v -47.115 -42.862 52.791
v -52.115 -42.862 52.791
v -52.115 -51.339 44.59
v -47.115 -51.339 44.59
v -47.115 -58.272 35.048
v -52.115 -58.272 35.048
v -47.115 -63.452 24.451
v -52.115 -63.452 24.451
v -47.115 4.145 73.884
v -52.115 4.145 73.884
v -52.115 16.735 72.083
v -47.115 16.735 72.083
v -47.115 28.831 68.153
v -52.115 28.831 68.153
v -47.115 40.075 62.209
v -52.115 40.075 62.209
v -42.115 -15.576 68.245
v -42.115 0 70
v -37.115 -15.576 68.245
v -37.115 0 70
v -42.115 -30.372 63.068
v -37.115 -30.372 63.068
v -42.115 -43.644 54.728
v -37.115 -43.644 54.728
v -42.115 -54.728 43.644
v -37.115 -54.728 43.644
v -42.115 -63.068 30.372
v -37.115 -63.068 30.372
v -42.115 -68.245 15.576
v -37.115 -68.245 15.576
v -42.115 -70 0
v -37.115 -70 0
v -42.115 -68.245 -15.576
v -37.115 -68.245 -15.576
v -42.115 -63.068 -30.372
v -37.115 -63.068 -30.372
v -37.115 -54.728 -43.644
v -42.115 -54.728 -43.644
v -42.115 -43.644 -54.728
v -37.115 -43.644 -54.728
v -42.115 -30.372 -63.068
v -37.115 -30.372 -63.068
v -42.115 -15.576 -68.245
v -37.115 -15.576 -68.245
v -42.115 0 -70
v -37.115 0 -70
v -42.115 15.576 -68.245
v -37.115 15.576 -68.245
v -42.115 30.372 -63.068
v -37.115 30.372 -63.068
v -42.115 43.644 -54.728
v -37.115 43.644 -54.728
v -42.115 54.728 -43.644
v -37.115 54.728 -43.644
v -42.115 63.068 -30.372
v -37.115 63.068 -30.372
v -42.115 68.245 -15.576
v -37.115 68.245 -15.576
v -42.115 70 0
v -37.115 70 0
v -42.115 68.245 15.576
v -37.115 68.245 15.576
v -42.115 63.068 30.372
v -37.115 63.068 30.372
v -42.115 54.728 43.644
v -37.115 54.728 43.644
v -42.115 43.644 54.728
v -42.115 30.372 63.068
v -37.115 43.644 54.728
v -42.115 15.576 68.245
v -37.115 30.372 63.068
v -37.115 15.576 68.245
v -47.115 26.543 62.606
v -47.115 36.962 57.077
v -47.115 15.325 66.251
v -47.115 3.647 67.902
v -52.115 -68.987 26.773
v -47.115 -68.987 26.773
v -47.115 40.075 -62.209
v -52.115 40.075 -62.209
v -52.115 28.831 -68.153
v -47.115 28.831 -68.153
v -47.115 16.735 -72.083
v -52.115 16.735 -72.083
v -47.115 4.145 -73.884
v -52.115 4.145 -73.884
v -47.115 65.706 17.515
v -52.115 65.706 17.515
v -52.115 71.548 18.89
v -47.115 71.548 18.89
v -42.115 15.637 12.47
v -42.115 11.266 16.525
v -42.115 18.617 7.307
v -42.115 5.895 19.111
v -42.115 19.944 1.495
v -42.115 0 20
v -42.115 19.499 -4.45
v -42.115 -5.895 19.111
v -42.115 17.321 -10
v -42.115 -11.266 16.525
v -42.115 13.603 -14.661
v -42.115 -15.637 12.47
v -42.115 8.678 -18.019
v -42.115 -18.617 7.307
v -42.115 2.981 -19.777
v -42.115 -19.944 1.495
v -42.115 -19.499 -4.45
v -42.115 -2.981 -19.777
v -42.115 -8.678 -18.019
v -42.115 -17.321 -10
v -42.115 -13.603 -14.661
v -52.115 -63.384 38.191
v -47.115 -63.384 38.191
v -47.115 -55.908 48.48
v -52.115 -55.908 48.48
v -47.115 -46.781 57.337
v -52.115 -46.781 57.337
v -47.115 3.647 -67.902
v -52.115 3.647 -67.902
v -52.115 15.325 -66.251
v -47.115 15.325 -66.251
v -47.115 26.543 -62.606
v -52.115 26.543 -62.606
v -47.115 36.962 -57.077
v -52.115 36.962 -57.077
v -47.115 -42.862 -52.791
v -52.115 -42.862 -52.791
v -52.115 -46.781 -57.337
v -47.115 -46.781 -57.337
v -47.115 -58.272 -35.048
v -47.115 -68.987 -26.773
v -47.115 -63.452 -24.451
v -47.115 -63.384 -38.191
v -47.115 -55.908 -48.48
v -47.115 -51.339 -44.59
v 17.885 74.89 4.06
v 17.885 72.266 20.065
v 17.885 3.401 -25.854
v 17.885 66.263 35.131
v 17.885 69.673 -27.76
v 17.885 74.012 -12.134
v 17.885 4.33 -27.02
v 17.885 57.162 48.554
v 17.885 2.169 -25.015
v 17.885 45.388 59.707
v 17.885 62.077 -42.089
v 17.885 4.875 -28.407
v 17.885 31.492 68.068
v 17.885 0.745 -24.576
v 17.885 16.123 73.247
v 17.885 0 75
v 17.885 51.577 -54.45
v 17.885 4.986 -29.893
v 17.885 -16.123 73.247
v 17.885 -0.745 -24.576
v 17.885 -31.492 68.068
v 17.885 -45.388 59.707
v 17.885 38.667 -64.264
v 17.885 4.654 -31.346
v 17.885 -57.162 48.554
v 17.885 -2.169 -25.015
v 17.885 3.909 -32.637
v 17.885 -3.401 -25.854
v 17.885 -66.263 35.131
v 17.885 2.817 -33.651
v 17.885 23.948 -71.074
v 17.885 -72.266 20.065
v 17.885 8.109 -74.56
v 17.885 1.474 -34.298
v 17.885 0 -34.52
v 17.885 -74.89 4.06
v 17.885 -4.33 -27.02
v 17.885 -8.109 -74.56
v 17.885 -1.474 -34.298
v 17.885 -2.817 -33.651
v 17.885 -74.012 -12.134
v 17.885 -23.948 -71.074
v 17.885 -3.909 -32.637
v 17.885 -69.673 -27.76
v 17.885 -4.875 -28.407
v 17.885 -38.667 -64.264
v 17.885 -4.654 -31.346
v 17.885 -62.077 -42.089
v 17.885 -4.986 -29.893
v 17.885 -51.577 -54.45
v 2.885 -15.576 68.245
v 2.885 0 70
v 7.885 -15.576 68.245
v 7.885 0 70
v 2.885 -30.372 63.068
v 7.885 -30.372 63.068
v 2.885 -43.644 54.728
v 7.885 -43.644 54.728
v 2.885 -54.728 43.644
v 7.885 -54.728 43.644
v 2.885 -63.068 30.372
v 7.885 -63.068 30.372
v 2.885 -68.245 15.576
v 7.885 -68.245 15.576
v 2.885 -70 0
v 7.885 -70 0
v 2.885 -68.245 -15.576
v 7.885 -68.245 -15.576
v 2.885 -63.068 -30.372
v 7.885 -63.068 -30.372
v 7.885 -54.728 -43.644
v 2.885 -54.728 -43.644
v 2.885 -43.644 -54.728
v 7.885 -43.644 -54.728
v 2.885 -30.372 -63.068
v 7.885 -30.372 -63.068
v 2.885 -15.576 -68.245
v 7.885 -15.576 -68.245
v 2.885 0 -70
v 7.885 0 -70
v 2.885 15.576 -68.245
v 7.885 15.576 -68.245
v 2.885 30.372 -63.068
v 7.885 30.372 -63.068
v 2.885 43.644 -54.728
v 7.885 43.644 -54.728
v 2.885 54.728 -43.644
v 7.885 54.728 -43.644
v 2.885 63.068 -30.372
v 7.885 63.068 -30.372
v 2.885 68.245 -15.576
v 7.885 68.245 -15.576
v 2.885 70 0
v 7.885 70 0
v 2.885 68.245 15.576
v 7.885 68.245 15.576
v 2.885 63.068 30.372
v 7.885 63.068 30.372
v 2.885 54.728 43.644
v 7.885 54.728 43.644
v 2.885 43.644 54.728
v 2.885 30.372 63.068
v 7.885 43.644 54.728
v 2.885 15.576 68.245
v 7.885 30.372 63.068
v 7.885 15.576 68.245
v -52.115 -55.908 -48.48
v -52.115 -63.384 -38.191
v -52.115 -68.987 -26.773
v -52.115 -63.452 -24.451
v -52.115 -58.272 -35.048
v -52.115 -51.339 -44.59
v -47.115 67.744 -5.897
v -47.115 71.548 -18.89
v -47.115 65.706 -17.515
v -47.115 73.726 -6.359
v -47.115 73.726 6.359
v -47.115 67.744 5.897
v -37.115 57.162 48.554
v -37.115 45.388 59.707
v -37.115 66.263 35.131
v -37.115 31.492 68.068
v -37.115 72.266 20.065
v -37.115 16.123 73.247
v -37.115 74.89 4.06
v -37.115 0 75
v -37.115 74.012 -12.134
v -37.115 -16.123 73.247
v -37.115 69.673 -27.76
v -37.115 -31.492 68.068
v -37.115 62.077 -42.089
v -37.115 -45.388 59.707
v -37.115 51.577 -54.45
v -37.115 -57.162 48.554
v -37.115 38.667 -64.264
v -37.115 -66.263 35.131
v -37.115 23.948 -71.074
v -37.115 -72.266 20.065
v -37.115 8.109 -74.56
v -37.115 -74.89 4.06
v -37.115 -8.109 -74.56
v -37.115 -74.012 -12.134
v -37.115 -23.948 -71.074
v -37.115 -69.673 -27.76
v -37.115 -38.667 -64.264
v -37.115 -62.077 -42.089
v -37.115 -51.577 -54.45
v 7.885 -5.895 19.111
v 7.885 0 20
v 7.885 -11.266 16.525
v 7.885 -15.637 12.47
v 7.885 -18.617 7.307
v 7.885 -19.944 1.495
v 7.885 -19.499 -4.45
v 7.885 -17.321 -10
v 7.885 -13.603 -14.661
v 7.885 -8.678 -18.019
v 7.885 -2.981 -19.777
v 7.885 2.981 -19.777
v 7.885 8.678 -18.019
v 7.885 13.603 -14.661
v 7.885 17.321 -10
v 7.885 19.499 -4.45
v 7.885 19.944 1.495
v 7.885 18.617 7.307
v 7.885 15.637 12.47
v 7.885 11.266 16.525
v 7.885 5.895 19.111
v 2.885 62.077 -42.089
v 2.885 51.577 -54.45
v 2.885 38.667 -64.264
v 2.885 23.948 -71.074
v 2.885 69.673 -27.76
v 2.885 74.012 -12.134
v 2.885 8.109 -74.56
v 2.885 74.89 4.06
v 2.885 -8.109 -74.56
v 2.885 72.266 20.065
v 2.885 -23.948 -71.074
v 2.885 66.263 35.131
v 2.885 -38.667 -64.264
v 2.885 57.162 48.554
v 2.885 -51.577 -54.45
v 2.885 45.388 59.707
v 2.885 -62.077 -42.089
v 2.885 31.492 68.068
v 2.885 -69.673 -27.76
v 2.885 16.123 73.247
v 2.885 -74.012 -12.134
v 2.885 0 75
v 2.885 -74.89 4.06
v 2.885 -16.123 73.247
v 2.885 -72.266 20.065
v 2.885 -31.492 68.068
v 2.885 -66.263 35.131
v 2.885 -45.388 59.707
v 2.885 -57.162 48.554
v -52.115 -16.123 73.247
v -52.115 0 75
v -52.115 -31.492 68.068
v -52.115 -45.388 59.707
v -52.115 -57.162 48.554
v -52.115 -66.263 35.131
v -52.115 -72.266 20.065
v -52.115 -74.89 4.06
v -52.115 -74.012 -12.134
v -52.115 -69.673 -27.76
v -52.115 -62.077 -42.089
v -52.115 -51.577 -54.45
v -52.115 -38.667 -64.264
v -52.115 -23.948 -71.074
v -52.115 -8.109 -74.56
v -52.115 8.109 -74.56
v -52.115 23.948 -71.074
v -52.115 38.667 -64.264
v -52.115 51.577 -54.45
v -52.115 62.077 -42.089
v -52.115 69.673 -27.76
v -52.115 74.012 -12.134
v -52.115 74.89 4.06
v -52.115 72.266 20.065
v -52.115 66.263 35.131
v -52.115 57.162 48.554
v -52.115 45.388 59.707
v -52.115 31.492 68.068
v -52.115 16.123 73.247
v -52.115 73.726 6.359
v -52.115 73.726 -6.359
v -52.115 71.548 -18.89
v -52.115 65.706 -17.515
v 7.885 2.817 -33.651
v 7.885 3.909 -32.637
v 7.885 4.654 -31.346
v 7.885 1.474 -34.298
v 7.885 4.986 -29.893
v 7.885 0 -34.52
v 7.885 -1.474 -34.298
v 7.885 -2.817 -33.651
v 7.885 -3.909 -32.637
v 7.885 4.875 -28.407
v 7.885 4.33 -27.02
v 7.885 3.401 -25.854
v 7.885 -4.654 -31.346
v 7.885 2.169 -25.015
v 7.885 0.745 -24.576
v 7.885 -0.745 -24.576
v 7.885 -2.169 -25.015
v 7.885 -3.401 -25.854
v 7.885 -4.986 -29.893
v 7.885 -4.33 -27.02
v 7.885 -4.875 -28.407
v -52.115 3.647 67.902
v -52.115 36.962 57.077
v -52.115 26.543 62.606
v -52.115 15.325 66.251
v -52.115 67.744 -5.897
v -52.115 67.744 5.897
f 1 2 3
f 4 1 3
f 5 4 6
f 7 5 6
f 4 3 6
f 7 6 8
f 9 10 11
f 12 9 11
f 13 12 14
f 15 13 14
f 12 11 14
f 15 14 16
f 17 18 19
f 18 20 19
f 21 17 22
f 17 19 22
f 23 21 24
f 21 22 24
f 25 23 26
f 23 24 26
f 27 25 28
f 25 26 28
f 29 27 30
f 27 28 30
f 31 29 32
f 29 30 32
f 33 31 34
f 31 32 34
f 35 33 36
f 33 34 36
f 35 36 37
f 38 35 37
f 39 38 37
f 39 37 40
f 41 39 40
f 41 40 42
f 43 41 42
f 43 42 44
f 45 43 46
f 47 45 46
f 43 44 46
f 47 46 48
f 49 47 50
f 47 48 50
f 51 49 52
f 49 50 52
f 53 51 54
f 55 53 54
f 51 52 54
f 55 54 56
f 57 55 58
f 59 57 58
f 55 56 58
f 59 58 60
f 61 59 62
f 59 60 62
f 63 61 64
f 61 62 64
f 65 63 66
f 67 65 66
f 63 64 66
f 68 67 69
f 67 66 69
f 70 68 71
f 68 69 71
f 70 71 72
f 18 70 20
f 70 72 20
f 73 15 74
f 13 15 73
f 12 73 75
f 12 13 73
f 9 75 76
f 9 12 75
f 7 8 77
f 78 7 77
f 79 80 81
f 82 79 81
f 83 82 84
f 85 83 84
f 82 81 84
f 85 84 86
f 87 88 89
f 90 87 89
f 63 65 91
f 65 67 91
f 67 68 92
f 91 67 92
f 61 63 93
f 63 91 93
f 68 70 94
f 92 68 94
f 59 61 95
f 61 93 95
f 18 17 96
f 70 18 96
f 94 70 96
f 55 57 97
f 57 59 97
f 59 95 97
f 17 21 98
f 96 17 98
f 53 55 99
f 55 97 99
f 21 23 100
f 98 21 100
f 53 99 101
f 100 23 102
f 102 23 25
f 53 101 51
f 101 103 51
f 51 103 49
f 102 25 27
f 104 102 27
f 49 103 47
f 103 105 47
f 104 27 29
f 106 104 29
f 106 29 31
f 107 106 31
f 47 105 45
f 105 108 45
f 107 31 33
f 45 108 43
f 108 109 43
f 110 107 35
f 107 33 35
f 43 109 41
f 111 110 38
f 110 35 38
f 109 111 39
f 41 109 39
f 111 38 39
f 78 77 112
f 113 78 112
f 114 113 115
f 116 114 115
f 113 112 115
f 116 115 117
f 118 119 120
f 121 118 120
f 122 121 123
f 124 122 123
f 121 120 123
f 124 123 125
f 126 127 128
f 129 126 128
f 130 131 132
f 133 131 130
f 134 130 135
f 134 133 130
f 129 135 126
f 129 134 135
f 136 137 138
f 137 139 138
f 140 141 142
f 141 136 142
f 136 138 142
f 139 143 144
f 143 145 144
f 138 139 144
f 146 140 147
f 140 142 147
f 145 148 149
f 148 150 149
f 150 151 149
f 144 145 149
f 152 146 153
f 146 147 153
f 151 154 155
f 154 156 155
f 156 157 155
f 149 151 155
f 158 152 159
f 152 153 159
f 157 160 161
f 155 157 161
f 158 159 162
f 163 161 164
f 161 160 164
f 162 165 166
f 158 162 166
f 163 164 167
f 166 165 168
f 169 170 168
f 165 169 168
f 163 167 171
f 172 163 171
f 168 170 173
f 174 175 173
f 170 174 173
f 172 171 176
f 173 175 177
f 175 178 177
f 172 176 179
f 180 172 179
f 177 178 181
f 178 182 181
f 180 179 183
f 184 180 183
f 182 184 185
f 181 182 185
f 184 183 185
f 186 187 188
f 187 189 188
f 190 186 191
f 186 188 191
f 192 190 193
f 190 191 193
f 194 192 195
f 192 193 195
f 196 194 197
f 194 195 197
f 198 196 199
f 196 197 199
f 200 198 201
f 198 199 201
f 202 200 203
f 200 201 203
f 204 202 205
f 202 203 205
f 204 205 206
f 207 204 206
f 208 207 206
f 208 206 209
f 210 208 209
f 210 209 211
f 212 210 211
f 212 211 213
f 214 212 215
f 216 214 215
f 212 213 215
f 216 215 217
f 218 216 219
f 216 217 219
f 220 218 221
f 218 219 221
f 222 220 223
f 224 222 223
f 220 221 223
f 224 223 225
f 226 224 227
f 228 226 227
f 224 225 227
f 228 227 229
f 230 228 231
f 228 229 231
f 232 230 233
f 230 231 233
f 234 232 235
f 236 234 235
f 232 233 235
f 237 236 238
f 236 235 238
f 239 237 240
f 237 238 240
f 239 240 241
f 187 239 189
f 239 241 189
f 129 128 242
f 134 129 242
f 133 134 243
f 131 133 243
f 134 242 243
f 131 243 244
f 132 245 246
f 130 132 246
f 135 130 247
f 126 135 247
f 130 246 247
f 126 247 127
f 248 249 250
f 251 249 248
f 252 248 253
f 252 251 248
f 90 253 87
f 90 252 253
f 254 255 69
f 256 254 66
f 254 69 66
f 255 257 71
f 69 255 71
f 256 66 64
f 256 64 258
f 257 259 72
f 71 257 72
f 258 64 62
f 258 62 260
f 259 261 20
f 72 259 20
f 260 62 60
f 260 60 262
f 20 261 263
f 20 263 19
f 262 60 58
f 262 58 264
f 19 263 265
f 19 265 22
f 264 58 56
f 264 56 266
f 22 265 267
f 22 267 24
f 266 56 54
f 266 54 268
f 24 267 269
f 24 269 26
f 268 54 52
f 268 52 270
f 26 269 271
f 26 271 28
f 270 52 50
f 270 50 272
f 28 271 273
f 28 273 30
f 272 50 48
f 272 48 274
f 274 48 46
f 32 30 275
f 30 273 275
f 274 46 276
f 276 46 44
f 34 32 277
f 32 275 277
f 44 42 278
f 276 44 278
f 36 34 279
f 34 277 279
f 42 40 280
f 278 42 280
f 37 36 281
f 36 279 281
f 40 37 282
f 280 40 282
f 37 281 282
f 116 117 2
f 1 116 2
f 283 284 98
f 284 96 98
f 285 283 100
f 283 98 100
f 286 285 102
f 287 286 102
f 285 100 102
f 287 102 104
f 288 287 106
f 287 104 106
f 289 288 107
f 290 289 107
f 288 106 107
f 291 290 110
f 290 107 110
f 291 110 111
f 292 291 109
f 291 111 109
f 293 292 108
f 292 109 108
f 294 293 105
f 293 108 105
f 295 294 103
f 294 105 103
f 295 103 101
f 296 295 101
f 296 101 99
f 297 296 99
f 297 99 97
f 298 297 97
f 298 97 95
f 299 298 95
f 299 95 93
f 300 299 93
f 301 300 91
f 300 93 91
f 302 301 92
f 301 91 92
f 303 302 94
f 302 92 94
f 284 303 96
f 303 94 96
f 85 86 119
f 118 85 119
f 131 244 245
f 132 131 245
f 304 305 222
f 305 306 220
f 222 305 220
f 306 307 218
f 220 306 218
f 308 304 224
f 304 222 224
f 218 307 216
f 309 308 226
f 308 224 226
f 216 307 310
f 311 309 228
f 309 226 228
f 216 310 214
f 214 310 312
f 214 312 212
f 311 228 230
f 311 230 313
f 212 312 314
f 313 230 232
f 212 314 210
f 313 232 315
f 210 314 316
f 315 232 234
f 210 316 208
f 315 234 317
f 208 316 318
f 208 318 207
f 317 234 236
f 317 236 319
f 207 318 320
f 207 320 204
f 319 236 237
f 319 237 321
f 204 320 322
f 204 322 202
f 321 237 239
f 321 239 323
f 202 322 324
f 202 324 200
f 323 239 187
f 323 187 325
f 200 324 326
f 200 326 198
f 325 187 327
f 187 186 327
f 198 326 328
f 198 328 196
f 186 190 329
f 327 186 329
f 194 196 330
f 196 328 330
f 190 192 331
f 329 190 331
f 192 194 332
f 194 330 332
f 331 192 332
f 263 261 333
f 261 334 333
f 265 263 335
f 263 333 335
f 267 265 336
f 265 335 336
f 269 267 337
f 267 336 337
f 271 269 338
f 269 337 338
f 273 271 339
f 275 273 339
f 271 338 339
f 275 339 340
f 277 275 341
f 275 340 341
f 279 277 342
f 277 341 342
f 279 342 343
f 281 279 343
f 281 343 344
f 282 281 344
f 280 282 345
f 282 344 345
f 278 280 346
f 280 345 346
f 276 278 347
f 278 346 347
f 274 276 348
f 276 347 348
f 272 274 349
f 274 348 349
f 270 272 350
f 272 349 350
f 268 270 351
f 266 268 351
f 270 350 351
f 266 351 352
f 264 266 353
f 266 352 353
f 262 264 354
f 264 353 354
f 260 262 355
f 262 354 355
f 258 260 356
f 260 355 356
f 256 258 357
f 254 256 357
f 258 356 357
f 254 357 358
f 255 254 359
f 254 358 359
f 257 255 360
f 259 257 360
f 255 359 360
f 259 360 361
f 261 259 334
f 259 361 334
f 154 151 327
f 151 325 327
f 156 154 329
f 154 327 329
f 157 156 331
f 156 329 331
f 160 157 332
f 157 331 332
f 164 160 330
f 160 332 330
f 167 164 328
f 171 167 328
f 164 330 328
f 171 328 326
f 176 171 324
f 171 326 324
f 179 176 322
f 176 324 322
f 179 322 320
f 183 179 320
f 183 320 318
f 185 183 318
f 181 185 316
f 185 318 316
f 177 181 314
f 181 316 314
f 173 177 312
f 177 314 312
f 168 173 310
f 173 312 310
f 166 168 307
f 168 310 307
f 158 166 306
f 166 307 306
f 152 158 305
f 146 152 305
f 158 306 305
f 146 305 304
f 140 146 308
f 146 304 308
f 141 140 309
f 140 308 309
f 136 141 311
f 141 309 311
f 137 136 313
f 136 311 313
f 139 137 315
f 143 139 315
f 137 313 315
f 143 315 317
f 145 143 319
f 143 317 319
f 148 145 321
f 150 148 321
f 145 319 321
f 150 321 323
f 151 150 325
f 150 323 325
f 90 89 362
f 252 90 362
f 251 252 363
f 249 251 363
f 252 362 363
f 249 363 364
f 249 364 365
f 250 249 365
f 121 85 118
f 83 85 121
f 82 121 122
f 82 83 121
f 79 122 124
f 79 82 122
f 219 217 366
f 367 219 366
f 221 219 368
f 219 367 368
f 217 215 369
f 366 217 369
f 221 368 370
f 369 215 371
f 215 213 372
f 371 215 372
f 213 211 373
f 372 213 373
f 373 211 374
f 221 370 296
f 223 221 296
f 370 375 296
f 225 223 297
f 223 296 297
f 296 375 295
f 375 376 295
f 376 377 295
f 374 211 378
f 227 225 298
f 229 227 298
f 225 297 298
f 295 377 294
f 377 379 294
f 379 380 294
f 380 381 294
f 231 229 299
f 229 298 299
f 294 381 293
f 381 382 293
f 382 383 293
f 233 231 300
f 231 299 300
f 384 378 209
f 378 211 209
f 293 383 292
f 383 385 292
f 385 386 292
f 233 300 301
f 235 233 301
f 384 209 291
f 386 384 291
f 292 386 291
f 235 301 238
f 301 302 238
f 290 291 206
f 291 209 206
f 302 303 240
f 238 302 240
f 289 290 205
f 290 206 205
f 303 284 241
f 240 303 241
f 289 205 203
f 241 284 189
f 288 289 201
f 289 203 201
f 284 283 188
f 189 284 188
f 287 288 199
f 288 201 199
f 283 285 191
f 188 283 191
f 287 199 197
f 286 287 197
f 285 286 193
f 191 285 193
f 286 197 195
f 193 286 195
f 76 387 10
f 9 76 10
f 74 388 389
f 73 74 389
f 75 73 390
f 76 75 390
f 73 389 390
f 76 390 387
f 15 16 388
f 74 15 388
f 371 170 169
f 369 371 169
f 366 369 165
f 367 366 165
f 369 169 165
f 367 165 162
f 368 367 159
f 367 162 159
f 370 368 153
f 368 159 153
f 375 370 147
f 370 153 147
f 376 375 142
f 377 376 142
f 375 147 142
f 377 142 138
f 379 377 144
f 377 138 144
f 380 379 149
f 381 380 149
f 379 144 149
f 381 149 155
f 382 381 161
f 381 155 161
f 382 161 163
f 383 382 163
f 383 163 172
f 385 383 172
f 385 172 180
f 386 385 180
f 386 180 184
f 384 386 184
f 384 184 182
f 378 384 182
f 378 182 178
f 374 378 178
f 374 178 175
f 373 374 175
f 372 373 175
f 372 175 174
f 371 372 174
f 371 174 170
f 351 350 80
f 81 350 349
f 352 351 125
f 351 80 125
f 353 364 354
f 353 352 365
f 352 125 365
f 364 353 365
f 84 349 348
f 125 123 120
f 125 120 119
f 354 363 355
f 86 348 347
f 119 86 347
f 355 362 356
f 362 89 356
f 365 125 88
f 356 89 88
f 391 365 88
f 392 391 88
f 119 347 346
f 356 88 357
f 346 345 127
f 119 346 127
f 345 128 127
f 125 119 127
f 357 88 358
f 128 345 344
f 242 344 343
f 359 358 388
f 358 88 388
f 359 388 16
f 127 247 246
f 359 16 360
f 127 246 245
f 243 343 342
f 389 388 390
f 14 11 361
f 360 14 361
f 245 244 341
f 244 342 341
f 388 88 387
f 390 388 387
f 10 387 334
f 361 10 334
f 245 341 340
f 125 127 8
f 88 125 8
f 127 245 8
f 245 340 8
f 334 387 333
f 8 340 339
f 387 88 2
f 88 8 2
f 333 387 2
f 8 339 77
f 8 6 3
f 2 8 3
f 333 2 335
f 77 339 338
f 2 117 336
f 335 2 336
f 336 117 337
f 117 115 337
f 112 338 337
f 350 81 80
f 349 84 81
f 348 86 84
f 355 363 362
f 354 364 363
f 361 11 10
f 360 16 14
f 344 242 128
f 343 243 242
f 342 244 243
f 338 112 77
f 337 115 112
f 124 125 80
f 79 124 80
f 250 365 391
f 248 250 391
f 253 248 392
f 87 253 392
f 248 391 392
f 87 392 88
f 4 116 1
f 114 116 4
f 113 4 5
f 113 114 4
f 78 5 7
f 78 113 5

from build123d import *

# Parameters (mm, degrees)
CUT_EXTRUDE1_DEPTH = 5
CIRPATTERN1_COUNT  = 5
SKETCH4_R          = 5
CUT_EXTRUDE4_DEPTH = 16


with BuildPart() as part:
    # Sketch1 → Revolve2 (revolve)
    with BuildSketch(Plane.XY, mode=Mode.PRIVATE) as revolve2_sk:
        Polygon((-52.115384615, 0), (17.884615385, 0), (17.884615385, 75), (2.884615385, 75), (2.884615385, 70), (7.884615385, 70), (7.884615385, 20), (-42.115384615, 20), (-42.115384615, 70), (-37.115384615, 70), (-37.115384615, 75), (-52.115384615, 75), align=None)
    revolve(revolve2_sk.sketch.rotate(Axis((-114.1965821, 0, 0), (1, 0, 0)), 90), axis=Axis((-114.1965821, 0, 0), (1, 0, 0)))

    # Sketch2 → Cut-Extrude1 (cut)
    with BuildSketch(Plane.ZY.offset(52.115384615)):
        with BuildLine():
            Line((-18.889553649, 71.548478411), (-17.514771122, 65.705652668))
            ThreePointArc((-17.514771122, 65.705652668), (0, 68), (17.514771122, 65.705652668))
            Line((17.514771122, 65.705652668), (18.889553649, 71.548478411))
            ThreePointArc((18.889553649, 71.548478411), (0, 74), (-18.889553649, 71.548478411))
        make_face()
    cut_extrude1 = extrude(amount=-CUT_EXTRUDE1_DEPTH, mode=Mode.SUBTRACT)

    # CirPattern1: Cut-Extrude1 ×5 about axis
    cirpattern1_axis = Axis((0, 0, 0), (1, 0, 0))
    for i in range(1, CIRPATTERN1_COUNT):
        add(cut_extrude1.rotate(cirpattern1_axis, i * 360 / CIRPATTERN1_COUNT), mode=Mode.SUBTRACT)

    # Sketch4 → Cut-Extrude4 (cut)
    with BuildSketch(Plane(origin=(17.884615385, 0, 0), x_dir=(0, 0, -1), z_dir=(1, 0, 0))):
        with Locations((29.519700861, 0)):
            Circle(SKETCH4_R)
    extrude(amount=-CUT_EXTRUDE4_DEPTH, mode=Mode.SUBTRACT)


solid = part.part
